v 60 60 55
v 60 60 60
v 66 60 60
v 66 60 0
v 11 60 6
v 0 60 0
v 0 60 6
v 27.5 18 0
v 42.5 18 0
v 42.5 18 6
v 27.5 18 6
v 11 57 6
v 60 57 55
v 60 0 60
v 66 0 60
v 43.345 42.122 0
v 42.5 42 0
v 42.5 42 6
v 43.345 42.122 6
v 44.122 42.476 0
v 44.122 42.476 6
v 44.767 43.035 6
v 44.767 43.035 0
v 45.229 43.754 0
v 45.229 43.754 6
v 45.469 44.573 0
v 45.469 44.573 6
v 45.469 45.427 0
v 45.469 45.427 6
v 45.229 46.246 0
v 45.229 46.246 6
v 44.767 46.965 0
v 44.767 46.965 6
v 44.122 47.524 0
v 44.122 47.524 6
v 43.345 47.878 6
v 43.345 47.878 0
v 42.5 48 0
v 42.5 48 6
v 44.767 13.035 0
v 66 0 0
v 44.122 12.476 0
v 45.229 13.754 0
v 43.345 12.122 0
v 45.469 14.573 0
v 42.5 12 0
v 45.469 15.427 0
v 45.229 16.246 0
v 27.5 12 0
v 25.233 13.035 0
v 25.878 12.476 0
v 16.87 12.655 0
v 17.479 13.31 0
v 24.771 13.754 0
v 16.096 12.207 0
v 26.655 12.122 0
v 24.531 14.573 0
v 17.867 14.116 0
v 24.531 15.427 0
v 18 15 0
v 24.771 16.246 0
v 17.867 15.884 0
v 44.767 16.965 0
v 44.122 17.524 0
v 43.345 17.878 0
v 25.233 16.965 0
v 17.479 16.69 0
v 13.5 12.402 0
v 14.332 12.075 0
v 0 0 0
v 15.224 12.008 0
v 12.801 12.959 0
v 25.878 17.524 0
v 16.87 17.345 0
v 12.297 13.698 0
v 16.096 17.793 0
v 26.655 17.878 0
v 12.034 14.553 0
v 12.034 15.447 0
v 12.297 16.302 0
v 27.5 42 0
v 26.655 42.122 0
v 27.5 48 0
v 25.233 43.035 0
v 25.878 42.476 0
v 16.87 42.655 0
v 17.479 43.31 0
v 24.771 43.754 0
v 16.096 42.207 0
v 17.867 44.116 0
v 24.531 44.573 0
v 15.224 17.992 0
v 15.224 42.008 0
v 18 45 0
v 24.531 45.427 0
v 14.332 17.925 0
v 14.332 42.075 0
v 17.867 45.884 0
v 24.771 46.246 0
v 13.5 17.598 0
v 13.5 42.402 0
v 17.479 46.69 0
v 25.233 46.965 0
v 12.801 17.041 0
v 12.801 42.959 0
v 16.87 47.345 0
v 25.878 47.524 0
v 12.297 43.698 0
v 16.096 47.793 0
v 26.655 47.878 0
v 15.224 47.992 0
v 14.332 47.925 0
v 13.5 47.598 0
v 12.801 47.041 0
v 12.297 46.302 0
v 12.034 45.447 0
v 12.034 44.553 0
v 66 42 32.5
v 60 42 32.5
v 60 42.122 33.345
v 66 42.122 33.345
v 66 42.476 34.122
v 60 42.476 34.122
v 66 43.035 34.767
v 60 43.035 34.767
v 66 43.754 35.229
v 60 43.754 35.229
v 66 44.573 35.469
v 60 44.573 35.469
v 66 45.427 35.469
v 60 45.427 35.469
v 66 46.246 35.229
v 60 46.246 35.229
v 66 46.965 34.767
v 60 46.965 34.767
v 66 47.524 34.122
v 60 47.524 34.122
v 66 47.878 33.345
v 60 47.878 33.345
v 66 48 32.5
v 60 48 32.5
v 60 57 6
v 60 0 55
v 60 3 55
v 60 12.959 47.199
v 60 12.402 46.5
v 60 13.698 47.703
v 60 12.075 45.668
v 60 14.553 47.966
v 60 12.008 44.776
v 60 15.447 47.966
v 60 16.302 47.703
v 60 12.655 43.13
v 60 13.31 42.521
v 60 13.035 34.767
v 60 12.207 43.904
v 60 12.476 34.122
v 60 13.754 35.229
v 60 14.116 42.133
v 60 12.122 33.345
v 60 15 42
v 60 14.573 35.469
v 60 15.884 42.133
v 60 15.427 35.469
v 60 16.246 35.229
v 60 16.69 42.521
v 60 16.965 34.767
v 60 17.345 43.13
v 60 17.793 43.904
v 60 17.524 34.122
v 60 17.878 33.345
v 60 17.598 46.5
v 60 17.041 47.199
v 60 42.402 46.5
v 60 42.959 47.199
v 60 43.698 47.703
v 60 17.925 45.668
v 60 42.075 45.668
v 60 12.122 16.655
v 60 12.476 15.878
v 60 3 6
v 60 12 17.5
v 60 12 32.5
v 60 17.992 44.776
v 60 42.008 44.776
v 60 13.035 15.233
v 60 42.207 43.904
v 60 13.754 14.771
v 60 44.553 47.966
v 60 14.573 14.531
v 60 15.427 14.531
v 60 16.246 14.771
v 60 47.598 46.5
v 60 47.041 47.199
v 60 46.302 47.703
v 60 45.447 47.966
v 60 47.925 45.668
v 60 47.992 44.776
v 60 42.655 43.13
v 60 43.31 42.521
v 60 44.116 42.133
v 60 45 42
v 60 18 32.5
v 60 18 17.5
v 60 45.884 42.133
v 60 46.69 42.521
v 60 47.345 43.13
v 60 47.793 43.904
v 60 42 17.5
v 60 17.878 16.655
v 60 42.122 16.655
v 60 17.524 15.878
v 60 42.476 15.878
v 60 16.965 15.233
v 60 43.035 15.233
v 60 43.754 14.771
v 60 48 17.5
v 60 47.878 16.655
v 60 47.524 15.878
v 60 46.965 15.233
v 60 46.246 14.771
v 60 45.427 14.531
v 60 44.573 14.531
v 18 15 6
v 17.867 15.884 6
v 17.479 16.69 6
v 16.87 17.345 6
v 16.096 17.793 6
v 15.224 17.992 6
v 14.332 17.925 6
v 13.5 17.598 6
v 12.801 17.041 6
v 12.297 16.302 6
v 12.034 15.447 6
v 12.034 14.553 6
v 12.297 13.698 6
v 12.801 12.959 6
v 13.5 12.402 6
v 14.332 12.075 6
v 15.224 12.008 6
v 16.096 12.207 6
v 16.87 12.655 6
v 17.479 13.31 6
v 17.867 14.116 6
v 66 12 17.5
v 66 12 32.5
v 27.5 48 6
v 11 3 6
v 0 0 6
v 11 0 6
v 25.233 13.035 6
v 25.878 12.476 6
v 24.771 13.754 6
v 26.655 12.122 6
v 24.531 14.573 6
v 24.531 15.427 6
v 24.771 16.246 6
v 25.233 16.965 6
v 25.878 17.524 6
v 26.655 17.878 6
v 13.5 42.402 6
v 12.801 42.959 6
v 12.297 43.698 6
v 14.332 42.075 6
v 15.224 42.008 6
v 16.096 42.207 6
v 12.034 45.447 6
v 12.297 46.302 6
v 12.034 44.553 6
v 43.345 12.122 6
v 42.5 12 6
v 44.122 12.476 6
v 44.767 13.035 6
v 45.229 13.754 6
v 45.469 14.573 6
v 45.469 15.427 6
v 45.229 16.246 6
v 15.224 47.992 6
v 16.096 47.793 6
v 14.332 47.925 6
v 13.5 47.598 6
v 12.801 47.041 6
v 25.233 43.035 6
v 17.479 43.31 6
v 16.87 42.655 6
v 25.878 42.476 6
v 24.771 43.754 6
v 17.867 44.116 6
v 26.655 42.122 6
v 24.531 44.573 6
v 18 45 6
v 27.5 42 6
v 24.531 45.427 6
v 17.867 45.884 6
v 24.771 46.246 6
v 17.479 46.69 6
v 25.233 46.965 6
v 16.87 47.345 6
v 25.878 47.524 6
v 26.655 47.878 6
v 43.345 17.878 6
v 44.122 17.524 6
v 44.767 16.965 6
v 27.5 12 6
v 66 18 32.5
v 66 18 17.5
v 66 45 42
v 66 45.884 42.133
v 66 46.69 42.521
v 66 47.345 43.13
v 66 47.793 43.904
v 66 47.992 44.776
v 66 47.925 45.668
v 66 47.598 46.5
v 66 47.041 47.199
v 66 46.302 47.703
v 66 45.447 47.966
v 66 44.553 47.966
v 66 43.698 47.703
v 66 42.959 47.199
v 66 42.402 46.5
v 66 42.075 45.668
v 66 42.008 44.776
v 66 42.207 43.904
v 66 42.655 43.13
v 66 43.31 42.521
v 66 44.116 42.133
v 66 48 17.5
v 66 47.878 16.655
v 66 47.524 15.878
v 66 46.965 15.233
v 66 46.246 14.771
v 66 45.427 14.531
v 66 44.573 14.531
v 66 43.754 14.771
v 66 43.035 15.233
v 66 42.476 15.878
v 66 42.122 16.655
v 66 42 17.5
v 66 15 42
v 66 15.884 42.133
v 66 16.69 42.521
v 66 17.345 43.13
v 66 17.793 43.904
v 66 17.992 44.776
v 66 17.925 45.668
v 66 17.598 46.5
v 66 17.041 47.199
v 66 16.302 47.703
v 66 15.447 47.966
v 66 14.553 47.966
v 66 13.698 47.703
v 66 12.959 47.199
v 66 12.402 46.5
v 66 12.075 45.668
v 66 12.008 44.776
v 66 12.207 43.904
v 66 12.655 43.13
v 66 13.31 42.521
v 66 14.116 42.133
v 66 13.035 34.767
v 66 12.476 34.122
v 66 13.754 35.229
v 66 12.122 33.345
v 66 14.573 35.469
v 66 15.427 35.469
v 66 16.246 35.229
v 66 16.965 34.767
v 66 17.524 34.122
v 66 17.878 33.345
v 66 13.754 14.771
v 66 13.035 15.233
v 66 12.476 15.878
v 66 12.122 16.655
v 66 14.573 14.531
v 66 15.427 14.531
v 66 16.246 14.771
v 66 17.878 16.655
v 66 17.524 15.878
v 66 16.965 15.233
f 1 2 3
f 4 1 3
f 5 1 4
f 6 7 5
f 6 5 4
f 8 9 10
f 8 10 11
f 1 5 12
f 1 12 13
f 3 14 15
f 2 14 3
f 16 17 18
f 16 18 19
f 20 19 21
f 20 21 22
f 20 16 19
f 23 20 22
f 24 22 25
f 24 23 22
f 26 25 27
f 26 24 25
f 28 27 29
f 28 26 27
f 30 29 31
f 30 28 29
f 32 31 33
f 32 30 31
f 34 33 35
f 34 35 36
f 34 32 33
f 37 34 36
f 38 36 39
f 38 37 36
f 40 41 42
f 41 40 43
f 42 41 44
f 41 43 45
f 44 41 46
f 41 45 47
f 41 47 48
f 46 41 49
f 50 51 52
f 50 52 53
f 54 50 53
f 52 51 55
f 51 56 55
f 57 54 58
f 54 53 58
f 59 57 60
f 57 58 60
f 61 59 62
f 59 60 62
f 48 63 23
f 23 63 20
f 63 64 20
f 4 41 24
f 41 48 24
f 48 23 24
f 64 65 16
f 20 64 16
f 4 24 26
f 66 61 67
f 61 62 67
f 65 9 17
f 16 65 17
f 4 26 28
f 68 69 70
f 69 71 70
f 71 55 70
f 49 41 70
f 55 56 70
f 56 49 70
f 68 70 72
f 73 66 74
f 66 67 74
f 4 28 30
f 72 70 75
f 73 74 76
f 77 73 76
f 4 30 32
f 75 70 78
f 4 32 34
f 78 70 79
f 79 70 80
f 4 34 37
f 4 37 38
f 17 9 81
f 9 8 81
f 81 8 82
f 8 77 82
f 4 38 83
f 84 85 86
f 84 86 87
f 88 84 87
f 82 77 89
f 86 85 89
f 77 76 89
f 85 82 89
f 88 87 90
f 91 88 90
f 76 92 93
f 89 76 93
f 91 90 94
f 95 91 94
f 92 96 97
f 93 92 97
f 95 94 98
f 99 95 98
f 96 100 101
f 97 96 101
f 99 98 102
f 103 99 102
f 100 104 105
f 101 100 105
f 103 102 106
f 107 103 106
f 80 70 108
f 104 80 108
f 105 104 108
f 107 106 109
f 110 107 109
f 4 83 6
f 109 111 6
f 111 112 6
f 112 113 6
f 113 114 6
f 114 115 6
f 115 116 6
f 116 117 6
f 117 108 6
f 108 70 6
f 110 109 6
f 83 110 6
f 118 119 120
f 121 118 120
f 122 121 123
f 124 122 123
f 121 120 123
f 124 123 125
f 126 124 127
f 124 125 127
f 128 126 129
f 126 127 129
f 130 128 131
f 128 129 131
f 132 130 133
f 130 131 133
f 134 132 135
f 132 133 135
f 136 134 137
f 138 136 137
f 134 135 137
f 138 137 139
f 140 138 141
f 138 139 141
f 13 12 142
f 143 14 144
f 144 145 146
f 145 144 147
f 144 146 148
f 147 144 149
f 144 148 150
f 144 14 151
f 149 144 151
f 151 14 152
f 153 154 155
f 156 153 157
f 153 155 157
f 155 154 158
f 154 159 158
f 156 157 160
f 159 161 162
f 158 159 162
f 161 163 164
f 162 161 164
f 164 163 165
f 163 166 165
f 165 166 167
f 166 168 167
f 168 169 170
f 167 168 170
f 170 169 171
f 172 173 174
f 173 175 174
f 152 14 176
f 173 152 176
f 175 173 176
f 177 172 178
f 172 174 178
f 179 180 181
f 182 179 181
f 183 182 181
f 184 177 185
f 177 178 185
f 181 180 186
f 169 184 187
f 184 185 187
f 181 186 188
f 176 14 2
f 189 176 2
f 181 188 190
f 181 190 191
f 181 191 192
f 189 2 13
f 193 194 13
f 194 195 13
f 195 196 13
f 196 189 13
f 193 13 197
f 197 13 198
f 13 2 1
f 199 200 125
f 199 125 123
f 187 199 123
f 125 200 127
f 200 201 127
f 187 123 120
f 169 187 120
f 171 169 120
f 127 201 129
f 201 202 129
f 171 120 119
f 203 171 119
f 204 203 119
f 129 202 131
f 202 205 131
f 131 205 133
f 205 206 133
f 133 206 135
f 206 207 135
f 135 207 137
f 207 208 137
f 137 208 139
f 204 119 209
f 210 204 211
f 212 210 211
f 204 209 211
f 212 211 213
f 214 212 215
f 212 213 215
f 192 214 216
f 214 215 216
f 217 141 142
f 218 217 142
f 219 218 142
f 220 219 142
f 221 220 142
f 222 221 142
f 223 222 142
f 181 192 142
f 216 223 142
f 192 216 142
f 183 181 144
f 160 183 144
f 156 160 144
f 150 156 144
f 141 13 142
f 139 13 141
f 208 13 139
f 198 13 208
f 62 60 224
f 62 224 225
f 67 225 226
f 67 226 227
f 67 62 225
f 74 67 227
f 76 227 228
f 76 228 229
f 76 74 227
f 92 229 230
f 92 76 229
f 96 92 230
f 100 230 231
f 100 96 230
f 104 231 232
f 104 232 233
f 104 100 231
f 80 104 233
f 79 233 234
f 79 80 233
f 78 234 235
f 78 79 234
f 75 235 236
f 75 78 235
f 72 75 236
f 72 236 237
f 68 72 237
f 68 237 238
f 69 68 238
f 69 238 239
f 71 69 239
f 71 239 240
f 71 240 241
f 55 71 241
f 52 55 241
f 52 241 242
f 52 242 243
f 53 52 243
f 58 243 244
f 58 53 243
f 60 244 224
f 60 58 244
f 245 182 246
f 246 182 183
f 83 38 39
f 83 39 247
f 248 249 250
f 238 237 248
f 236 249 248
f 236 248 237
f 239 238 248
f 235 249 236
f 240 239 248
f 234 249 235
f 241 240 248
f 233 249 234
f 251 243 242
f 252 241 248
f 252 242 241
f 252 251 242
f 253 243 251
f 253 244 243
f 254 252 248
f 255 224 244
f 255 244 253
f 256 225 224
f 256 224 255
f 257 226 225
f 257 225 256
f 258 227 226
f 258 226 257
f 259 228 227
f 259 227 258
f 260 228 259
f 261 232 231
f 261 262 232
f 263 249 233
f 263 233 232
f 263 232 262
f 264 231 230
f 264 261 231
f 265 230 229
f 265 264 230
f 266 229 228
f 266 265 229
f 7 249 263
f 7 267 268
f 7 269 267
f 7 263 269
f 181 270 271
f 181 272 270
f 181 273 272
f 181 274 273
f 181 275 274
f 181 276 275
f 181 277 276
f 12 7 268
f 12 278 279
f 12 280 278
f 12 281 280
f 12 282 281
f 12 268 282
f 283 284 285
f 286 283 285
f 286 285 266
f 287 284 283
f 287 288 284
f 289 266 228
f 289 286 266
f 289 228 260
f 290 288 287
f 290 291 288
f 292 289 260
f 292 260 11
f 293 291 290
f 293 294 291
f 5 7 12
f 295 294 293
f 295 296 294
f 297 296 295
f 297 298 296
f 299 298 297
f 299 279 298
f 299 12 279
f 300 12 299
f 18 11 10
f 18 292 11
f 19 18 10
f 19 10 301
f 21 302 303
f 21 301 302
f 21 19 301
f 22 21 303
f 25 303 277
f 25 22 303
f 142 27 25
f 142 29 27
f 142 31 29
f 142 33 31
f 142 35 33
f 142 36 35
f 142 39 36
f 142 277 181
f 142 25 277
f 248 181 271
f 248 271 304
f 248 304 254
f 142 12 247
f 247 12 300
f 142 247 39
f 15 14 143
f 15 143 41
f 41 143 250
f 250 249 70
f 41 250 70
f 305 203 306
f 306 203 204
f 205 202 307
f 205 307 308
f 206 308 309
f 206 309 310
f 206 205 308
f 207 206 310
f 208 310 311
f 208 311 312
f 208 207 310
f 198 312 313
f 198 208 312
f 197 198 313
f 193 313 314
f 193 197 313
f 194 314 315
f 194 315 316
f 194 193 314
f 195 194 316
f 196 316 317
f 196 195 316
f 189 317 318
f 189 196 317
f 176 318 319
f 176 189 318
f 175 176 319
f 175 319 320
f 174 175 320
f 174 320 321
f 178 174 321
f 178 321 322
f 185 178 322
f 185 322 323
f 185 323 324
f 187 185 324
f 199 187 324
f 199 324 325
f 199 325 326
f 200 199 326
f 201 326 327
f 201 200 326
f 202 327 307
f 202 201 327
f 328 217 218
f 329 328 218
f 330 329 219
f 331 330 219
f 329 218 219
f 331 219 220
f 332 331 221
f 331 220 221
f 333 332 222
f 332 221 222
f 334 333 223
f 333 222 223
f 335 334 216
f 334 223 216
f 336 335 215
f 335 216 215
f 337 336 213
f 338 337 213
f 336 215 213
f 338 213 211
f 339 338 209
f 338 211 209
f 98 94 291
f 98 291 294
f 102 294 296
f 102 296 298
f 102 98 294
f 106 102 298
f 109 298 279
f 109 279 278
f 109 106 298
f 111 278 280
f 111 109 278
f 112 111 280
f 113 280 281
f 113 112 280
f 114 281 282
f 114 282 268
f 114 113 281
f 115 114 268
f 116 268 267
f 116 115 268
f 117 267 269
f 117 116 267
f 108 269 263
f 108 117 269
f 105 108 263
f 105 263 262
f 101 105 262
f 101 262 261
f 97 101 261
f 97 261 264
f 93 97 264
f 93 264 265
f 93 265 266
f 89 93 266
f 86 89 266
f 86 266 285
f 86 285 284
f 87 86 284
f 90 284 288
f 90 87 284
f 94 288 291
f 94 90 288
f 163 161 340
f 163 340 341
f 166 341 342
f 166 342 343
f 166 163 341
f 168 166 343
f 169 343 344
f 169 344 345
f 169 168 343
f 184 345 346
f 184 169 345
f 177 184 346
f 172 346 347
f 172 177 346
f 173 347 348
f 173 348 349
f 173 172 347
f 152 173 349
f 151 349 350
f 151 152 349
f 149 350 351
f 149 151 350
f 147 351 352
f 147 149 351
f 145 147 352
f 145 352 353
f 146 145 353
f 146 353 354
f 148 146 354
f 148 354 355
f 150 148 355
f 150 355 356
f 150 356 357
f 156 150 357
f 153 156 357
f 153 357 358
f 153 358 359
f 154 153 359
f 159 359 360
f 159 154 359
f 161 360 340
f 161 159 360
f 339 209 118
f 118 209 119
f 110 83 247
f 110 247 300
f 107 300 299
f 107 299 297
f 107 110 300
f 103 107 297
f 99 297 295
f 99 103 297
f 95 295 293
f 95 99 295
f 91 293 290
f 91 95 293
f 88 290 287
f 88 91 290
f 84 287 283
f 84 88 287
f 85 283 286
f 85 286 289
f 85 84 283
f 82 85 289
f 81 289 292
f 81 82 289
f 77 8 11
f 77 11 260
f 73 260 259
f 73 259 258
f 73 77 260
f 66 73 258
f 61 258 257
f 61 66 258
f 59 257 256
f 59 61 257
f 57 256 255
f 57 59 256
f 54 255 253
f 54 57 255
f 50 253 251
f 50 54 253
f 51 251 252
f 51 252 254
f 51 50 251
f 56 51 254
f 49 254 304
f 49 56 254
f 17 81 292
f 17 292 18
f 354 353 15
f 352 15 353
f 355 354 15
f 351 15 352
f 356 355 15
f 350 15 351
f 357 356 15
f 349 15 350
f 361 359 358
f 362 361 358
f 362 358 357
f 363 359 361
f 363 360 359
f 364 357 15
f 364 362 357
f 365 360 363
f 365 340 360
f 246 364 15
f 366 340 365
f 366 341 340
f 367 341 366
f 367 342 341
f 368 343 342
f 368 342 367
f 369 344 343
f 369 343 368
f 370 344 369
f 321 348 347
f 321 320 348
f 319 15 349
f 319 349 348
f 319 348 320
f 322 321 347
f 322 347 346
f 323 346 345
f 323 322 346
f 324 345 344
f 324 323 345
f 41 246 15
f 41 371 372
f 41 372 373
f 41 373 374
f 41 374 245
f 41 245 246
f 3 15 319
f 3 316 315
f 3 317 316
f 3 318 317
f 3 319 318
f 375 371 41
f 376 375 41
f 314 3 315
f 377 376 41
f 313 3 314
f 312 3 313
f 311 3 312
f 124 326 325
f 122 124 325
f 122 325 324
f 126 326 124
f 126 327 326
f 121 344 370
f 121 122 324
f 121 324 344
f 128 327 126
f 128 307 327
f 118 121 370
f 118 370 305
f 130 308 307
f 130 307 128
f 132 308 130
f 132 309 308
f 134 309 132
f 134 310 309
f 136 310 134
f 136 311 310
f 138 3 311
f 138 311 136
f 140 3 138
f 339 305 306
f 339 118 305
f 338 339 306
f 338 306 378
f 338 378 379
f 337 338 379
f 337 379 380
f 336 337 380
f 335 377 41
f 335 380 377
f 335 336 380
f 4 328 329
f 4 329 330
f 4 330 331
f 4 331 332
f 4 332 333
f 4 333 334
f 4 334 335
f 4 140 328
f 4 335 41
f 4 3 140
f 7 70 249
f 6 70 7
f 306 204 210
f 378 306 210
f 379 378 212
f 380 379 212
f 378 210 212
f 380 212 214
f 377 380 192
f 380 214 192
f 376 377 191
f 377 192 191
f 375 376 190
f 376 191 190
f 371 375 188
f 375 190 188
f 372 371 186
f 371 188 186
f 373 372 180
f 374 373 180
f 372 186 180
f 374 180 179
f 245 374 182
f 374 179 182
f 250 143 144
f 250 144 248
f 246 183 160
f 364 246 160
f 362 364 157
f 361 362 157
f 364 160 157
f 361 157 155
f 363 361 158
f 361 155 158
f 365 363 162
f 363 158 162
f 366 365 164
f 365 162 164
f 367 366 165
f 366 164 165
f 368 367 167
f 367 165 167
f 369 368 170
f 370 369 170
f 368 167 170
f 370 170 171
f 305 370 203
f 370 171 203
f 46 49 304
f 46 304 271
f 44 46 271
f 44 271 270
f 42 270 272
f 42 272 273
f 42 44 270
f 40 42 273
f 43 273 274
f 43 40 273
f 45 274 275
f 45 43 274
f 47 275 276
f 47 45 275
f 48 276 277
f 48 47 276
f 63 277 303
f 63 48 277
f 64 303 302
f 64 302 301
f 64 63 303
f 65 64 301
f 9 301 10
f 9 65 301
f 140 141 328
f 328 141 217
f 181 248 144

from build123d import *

# Parameters (mm, degrees)
SKETCH1_W           = 60
SKETCH1_H           = 60
SKETCH1_R           = 3
BOSS_EXTRUDE1_DEPTH = 6
SKETCH2_W           = 60
SKETCH2_H           = 60
SKETCH2_R           = 3
BOSS_EXTRUDE2_DEPTH = 6
BOSS_EXTRUDE3_DEPTH = 3
BOSS_EXTRUDE4_DEPTH = 3


with BuildPart() as part:
    # Sketch1 → Boss-Extrude1 (new body)
    with BuildSketch(Plane.XY):
        with Locations((30, 30)):
            Rectangle(SKETCH1_W, SKETCH1_H)
        with Locations((15, 45)):
            Circle(SKETCH1_R, mode=Mode.SUBTRACT)
        with Locations((15, 15)):
            Circle(SKETCH1_R, mode=Mode.SUBTRACT)
        with BuildLine():
            Line((27.5, 42), (42.5, 42))
            ThreePointArc((42.5, 42), (45.5, 45), (42.5, 48))
            Line((42.5, 48), (27.5, 48))
            ThreePointArc((27.5, 48), (24.5, 45), (27.5, 42))
        make_face(mode=Mode.SUBTRACT)
        with BuildLine():
            Line((27.5, 12), (42.5, 12))
            ThreePointArc((42.5, 12), (45.5, 15), (42.5, 18))
            Line((42.5, 18), (27.5, 18))
            ThreePointArc((27.5, 18), (24.5, 15), (27.5, 12))
        make_face(mode=Mode.SUBTRACT)
    extrude(amount=BOSS_EXTRUDE1_DEPTH)

    # Sketch2 → Boss-Extrude2 (add)
    with BuildSketch(Plane(origin=(60, 0, 0), x_dir=(0, 0, -1), z_dir=(1, 0, 0))):
        with Locations((-30, 30)):
            Rectangle(SKETCH2_W, SKETCH2_H)
        with Locations((-45, 45)):
            Circle(SKETCH2_R, mode=Mode.SUBTRACT)
        with Locations((-45, 15)):
            Circle(SKETCH2_R, mode=Mode.SUBTRACT)
        with BuildLine():
            Line((-32.5, 48), (-17.5, 48))
            ThreePointArc((-17.5, 48), (-14.5, 45), (-17.5, 42))
            Line((-17.5, 42), (-32.5, 42))
            ThreePointArc((-32.5, 42), (-35.5, 45), (-32.5, 48))
        make_face(mode=Mode.SUBTRACT)
        with BuildLine():
            Line((-32.5, 18), (-17.5, 18))
            ThreePointArc((-17.5, 18), (-14.5, 15), (-17.5, 12))
            Line((-17.5, 12), (-32.5, 12))
            ThreePointArc((-32.5, 12), (-35.5, 15), (-32.5, 18))
        make_face(mode=Mode.SUBTRACT)
    extrude(amount=BOSS_EXTRUDE2_DEPTH)

    # Sketch3 → Boss-Extrude3 (add)
    with BuildSketch(Plane(origin=(0, 60, 0), x_dir=(1, 0, 0), z_dir=(0, 1, 0))):
        Polygon((66, 0), (11, 0), (11, -6), (60, -55), (66, -55), align=None)
    extrude(amount=-BOSS_EXTRUDE3_DEPTH)

    # Sketch4 → Boss-Extrude4 (add)
    with BuildSketch(Plane.XZ):
        Polygon((66, 0), (66, 55), (60, 55), (11, 6), (11, 0), align=None)
    extrude(amount=-BOSS_EXTRUDE4_DEPTH)


solid = part.part
